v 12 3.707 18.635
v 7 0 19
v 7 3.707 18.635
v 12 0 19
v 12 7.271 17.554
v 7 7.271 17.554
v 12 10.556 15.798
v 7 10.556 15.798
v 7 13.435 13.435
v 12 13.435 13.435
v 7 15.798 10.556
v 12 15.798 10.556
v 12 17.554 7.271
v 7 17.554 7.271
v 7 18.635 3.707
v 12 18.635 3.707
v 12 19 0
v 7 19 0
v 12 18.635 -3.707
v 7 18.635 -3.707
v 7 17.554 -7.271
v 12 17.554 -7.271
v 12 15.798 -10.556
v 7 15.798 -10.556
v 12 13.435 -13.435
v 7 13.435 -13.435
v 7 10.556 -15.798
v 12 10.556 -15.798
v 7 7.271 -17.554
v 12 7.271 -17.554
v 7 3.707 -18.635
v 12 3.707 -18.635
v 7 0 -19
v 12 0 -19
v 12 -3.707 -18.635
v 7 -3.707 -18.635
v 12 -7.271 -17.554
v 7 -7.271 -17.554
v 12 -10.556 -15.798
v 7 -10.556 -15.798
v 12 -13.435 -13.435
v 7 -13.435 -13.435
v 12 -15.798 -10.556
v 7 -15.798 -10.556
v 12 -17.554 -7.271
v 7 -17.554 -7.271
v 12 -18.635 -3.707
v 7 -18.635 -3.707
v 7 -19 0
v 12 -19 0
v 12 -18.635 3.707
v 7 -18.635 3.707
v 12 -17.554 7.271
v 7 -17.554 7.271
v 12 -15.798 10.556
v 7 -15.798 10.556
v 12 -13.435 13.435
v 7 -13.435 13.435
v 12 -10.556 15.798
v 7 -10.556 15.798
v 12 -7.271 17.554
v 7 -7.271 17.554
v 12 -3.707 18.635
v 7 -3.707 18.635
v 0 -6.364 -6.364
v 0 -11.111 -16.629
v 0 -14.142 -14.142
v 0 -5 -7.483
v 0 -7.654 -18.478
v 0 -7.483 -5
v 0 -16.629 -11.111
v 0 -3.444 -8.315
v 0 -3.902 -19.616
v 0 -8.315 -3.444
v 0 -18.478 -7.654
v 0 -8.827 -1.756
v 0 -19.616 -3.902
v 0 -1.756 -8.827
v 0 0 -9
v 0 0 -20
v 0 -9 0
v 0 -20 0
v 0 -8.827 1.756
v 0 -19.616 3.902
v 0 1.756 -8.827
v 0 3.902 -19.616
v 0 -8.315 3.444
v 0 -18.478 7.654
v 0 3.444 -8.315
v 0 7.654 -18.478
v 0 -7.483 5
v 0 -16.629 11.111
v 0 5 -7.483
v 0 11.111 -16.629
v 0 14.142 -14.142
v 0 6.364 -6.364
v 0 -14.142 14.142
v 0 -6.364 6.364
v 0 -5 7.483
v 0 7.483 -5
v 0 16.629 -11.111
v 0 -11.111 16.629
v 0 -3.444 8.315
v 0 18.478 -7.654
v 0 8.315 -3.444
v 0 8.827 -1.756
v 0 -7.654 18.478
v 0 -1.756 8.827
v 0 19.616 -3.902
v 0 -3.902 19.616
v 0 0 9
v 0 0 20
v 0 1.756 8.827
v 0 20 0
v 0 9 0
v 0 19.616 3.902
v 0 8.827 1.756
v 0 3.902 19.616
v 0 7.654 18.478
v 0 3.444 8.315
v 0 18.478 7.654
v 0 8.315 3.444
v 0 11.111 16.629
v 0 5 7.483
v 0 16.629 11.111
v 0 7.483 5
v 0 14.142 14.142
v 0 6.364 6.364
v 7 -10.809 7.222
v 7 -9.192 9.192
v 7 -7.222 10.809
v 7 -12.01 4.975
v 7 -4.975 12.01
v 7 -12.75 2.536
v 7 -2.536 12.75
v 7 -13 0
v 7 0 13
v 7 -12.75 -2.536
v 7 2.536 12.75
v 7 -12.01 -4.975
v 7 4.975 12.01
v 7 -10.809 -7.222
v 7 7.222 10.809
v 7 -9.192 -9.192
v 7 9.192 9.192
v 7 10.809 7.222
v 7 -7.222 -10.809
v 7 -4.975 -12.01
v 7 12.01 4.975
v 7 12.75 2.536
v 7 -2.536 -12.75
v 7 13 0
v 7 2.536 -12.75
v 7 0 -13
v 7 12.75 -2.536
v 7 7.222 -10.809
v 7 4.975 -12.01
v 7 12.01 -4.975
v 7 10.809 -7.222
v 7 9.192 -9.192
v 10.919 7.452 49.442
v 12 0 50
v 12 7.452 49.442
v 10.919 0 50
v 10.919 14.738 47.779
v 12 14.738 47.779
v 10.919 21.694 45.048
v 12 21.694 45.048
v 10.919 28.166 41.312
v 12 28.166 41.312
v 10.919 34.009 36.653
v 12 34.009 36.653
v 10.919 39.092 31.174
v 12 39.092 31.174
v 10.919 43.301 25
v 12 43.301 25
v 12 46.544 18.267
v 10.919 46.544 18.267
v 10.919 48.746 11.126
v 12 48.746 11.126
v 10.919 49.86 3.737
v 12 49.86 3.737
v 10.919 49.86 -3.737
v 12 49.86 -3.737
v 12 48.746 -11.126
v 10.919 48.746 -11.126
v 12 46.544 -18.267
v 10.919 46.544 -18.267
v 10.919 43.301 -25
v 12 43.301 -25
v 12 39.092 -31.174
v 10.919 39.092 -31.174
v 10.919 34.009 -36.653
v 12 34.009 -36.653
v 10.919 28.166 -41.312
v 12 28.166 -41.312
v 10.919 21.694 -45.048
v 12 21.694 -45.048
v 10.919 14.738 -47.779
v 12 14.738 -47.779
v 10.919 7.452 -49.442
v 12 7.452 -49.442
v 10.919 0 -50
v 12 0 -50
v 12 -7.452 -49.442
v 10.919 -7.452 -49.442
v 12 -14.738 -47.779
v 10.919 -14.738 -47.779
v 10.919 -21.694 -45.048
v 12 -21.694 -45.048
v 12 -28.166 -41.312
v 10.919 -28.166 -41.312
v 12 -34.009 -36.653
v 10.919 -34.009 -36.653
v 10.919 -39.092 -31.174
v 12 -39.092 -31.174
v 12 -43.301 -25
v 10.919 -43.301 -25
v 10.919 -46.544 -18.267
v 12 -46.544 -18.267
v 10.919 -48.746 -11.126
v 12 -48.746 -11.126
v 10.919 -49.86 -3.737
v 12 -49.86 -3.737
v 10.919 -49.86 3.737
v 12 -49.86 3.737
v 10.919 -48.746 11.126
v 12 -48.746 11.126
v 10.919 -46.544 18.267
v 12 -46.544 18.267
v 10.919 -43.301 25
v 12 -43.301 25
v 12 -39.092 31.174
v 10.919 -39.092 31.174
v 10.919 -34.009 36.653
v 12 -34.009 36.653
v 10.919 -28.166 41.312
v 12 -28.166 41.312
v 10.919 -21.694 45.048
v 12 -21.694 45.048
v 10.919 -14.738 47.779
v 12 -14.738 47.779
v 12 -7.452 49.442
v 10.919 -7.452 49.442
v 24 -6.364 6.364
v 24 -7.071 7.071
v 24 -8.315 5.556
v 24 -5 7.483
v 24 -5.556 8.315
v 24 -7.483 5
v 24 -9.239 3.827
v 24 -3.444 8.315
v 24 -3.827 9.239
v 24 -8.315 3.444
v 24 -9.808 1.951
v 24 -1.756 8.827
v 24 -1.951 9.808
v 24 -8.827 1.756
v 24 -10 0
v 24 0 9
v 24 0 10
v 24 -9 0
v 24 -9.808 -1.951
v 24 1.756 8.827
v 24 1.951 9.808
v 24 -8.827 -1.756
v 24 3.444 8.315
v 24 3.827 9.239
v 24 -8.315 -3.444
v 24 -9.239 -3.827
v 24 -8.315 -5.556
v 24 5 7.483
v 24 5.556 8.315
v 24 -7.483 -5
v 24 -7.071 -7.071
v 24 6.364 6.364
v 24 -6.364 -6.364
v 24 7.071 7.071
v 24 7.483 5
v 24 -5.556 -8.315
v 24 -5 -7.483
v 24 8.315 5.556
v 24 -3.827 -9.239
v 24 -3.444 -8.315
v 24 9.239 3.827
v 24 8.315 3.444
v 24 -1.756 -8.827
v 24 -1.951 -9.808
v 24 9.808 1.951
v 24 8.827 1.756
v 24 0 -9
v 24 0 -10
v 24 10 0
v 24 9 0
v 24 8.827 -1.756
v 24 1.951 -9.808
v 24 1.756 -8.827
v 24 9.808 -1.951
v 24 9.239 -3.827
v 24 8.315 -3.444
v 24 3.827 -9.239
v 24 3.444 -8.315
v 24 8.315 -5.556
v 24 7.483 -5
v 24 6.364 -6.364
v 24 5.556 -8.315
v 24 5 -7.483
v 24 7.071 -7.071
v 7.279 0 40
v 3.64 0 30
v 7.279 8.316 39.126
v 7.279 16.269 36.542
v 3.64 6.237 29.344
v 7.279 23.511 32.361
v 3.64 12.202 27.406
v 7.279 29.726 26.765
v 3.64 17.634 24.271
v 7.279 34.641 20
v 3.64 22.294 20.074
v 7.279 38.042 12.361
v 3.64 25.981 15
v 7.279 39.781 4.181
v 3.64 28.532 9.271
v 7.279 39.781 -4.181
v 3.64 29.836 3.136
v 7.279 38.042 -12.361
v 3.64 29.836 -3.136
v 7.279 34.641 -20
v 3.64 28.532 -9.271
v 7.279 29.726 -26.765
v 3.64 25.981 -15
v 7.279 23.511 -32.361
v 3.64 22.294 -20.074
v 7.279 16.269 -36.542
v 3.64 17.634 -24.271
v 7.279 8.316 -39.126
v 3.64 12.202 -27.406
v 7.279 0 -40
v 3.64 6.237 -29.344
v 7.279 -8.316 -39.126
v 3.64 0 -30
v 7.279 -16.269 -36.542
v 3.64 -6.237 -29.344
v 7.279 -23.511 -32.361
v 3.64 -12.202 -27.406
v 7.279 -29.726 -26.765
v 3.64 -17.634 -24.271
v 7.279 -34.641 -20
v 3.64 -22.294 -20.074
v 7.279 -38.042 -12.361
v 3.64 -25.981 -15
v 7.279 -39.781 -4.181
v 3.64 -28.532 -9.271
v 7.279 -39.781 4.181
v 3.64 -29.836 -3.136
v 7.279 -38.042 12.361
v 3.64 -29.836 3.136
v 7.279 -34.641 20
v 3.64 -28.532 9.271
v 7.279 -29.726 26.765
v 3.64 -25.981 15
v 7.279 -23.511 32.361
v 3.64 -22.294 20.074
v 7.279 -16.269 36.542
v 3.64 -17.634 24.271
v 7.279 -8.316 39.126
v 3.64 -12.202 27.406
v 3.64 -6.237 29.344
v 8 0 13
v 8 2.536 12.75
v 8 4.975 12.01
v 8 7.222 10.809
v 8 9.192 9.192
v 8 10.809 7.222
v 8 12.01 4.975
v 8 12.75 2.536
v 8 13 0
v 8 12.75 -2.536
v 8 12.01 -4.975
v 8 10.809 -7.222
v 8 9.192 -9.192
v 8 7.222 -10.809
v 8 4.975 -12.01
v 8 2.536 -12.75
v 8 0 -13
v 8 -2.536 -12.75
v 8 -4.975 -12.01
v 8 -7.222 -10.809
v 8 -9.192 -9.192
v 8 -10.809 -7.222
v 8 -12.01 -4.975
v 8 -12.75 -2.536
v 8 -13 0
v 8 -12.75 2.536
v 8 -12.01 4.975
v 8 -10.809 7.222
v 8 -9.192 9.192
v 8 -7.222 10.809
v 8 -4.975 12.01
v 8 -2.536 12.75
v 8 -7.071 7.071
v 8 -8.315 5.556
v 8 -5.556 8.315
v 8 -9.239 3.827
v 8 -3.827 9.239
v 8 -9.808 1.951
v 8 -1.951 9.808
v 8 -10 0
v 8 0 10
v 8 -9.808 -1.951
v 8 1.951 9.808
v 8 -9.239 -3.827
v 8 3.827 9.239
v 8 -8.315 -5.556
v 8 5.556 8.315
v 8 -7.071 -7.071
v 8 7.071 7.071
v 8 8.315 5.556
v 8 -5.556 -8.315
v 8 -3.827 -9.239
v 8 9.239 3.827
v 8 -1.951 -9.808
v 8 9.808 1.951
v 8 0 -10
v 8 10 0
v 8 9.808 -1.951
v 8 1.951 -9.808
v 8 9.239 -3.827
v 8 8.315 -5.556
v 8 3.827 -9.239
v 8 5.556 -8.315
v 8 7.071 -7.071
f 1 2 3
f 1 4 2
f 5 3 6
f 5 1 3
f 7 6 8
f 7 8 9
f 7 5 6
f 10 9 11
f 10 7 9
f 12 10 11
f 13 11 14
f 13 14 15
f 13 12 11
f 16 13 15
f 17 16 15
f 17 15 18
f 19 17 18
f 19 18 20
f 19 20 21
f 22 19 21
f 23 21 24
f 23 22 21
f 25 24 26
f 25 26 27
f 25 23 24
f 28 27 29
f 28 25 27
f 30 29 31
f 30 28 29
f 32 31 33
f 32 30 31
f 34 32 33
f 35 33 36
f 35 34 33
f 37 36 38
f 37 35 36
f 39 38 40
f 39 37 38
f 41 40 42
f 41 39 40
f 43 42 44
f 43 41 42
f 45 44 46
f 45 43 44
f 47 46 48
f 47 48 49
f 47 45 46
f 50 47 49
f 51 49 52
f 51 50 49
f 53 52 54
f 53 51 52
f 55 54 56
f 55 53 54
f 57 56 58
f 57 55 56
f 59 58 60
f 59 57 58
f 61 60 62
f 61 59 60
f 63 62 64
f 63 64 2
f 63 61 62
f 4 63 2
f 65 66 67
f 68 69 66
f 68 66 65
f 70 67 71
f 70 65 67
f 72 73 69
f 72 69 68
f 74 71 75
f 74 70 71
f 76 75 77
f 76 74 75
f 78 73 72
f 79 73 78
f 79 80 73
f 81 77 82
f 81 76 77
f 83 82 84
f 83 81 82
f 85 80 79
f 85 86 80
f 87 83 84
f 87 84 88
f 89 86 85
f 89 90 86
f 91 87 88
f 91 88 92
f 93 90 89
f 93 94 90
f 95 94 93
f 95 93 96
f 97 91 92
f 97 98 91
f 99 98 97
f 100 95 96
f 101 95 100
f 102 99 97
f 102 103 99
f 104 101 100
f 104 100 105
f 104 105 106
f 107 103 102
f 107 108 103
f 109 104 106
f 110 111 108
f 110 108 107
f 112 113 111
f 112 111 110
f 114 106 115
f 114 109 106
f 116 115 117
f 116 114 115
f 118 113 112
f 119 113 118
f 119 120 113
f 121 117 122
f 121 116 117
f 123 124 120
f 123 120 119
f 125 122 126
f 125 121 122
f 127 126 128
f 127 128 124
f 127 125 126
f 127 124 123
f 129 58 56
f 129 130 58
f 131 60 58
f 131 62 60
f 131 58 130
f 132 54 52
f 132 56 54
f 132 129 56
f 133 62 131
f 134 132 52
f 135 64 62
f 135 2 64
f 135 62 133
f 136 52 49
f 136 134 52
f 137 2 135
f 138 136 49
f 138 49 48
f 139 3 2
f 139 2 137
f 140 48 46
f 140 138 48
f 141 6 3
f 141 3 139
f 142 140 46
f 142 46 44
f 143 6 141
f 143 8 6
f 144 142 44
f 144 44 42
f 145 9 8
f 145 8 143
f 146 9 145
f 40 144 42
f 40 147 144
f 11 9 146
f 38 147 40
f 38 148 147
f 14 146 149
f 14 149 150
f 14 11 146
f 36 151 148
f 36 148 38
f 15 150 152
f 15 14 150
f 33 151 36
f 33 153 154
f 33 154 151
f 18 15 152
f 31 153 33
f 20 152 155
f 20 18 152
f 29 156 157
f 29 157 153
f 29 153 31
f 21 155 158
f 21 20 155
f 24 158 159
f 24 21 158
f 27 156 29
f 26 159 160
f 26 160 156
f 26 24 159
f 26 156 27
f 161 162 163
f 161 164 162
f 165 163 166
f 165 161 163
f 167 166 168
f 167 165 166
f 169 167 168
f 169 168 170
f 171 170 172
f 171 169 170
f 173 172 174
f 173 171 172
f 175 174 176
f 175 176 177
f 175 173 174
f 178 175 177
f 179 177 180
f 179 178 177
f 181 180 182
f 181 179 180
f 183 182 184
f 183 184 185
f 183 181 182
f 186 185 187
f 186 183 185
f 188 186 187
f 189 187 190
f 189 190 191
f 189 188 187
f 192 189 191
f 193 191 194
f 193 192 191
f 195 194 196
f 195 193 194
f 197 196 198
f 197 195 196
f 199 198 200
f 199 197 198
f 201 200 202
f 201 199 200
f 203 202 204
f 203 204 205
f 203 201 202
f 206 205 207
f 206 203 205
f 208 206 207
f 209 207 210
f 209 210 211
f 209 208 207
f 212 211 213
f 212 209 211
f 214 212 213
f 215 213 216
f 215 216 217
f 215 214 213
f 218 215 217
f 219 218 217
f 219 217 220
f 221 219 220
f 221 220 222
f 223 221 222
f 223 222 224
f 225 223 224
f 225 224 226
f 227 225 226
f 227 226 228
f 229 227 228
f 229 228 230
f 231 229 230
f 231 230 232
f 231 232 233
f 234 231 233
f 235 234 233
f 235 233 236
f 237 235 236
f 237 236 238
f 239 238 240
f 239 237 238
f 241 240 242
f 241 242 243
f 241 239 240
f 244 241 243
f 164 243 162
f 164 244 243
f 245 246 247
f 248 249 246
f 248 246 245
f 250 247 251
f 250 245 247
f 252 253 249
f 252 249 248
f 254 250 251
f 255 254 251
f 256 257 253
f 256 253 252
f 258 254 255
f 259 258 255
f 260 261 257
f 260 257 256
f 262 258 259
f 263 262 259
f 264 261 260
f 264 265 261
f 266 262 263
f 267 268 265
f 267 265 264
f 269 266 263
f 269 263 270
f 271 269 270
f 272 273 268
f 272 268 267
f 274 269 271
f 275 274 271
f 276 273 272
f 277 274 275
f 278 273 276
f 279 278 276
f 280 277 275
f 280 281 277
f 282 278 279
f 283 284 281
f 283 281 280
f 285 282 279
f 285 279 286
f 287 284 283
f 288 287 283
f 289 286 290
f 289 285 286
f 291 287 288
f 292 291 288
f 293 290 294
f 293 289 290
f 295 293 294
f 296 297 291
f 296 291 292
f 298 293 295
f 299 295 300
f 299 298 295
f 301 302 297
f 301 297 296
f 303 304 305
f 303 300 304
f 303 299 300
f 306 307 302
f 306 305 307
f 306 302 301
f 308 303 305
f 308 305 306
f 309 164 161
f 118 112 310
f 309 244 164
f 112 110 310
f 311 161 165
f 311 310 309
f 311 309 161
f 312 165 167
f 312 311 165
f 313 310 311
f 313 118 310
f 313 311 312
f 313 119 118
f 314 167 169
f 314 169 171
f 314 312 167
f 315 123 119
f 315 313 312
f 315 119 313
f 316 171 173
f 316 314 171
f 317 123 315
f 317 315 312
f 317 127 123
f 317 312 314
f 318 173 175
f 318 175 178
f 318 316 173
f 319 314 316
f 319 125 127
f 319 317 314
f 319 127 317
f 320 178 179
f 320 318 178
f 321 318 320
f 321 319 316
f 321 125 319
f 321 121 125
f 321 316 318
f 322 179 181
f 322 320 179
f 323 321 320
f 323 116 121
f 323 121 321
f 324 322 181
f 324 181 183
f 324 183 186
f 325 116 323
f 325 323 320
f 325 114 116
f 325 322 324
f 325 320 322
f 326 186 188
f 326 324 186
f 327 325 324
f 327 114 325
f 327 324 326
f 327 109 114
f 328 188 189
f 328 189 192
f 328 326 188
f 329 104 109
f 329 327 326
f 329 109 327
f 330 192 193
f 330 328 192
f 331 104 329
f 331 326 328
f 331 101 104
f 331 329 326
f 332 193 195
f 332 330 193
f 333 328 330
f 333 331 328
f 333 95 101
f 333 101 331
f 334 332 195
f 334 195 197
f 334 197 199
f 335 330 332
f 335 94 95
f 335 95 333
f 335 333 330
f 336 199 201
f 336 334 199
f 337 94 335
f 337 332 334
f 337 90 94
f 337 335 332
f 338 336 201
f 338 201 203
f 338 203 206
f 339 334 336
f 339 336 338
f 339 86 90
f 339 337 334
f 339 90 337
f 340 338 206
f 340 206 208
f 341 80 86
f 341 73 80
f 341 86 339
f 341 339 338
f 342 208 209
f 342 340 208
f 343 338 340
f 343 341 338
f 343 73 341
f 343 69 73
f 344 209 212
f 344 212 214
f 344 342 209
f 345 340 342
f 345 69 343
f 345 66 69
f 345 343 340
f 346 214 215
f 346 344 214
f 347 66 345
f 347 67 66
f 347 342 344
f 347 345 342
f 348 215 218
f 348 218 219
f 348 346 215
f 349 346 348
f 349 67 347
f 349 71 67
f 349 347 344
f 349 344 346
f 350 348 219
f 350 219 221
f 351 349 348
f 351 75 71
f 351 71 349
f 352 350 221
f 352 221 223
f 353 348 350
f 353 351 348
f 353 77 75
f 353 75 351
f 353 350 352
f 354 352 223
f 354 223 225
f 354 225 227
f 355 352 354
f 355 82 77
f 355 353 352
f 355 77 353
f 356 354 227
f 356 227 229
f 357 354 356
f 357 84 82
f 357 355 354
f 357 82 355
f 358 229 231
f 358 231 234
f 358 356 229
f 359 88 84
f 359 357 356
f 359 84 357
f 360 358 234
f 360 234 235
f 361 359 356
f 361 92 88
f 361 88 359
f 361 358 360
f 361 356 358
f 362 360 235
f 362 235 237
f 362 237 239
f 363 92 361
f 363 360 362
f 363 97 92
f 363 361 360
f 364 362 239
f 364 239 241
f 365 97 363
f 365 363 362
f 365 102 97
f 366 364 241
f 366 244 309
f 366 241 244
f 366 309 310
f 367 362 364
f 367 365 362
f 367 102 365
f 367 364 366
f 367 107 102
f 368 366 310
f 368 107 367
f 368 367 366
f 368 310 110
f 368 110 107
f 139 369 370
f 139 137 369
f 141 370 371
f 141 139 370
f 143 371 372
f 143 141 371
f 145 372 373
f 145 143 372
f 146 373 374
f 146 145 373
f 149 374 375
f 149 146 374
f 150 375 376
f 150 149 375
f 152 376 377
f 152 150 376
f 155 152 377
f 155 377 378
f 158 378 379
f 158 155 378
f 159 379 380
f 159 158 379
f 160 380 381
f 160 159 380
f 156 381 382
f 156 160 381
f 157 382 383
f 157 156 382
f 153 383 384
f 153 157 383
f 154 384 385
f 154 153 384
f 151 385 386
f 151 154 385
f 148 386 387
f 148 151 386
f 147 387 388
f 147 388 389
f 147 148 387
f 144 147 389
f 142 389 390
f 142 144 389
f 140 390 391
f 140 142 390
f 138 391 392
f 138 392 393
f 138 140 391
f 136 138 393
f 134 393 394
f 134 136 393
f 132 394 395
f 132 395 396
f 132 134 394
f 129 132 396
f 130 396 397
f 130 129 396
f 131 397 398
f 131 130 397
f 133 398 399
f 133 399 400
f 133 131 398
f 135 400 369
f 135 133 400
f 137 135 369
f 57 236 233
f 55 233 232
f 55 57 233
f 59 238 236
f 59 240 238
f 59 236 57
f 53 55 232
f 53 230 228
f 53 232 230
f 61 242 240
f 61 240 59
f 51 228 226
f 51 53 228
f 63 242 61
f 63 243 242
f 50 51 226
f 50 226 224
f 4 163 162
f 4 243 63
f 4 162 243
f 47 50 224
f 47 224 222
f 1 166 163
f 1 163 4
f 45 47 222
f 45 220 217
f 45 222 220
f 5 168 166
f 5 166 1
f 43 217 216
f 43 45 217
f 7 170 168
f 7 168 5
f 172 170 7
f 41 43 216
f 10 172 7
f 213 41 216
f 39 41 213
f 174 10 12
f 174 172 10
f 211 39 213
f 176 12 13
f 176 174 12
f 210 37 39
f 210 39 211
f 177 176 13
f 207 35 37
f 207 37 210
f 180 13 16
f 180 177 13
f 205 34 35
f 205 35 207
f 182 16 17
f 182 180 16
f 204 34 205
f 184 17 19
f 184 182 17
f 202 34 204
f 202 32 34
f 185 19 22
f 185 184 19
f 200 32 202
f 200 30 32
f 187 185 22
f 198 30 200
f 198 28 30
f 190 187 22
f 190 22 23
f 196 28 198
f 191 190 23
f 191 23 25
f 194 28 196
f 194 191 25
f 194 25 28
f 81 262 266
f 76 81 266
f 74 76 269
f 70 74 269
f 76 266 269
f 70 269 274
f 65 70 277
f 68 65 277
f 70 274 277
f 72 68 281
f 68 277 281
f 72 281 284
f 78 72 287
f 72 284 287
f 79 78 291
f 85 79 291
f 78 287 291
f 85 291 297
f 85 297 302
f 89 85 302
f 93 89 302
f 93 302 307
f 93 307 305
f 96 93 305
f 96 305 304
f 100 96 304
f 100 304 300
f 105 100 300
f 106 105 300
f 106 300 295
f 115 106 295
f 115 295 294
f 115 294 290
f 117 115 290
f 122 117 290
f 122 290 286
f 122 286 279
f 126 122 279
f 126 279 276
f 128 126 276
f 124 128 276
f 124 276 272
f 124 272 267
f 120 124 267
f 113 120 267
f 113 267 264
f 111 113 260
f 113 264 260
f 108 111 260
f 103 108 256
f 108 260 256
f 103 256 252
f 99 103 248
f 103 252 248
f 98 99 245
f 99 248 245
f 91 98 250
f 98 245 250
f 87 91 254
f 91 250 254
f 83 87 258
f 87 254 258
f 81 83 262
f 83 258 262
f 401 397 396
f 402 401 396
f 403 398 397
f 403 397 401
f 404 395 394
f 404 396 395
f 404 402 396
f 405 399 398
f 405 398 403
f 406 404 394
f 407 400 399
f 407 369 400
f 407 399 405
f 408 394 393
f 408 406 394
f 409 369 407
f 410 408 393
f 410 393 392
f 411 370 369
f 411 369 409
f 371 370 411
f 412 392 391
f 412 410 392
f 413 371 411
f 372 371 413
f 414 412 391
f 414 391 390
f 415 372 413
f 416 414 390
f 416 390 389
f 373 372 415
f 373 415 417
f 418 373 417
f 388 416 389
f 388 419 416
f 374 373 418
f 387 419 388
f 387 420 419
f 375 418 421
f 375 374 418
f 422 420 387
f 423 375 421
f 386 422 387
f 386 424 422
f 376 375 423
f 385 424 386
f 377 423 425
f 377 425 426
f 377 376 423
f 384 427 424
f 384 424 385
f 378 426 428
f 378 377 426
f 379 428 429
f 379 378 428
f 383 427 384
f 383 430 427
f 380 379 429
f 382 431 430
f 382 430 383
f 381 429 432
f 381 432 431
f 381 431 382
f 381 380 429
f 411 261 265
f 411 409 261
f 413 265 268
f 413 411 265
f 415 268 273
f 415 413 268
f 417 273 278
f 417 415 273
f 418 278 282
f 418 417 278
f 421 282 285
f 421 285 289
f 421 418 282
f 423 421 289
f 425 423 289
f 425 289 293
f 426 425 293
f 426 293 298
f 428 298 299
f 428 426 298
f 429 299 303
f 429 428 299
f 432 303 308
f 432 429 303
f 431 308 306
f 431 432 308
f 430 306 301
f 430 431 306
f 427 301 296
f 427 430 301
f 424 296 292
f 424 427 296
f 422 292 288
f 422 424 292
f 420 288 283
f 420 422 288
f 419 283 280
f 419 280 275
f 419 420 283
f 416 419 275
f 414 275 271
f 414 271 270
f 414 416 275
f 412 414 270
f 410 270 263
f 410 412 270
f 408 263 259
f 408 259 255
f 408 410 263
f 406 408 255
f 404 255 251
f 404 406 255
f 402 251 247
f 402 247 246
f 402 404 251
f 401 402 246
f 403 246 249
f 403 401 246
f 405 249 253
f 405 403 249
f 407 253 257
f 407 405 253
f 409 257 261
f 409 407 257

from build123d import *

# Parameters (mm, degrees)
F3_D = 18


with BuildPart() as f1:
    # F0 (on Front) → F1 (revolve)
    with BuildSketch(Plane.XZ):
        Polygon((10.919107, 50), (0, 20), (0, 0), (24, 0), (24, 10), (12, 10), (8, 10), (8, 13), (7, 13), (7, 19), (12, 19), (12, 50), align=None)
    revolve(axis=Axis((12, 0, 0), (-1, 0, 0)))

    # F3 (through all)
    with Locations(Plane(origin=(0, 0, 0), x_dir=(0, 1, 0), z_dir=(-1, 0, 0))):
        with Locations((0, 0)):
            Hole(F3_D / 2)


solid = f1.part
